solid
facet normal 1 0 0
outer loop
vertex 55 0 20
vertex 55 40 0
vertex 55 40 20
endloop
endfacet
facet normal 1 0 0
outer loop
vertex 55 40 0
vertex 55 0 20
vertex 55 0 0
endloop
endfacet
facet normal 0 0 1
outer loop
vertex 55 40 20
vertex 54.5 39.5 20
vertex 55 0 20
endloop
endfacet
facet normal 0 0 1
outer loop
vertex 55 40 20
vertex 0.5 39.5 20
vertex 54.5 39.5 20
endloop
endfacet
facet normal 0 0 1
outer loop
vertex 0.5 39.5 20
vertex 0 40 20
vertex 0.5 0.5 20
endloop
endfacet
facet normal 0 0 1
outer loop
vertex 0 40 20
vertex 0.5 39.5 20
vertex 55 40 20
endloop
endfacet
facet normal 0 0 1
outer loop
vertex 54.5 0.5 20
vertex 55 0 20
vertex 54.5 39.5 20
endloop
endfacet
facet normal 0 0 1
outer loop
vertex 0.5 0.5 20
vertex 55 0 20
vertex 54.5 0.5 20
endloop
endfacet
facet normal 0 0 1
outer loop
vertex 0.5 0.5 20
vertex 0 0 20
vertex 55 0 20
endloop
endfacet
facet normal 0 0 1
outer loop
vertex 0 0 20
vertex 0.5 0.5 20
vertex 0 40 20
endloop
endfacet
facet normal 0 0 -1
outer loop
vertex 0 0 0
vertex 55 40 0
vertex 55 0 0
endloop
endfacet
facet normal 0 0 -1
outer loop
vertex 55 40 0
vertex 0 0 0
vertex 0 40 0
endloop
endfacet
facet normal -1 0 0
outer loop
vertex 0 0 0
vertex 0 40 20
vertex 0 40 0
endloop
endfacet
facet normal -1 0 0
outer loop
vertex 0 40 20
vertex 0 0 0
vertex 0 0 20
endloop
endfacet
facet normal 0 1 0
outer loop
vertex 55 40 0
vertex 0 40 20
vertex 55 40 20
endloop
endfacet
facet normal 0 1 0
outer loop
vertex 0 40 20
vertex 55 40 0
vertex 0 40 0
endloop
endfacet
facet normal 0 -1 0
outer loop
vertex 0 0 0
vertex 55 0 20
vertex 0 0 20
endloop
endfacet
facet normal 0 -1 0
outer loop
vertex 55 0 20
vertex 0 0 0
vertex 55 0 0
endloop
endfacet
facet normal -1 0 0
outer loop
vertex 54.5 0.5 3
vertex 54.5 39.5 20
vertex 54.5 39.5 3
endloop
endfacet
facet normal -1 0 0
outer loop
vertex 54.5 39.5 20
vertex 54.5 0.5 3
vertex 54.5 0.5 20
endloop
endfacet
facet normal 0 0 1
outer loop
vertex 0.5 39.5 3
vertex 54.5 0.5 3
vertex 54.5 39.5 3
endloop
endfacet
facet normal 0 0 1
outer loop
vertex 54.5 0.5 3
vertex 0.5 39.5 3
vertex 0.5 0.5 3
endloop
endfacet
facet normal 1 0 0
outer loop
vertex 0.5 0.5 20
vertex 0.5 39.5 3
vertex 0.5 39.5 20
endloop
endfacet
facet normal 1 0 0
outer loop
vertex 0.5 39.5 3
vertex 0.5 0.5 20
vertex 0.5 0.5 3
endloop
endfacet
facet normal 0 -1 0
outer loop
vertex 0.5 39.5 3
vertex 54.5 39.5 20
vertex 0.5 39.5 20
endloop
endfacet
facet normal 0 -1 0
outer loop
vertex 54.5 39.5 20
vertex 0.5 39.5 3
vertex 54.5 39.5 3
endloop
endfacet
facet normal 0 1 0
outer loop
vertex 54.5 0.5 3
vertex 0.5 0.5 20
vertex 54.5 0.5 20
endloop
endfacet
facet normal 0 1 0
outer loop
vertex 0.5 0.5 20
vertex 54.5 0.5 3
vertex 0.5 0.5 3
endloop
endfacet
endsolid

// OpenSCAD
module mesh() {

    difference() {
        thickness = 0.5;
        size_x=55;
        size_y=40;
        cube([55,40,20]);
     
        translate([thickness, thickness,3])
        cube([size_x-2*thickness,size_y-2*thickness,100]);
    }
}

mesh();
